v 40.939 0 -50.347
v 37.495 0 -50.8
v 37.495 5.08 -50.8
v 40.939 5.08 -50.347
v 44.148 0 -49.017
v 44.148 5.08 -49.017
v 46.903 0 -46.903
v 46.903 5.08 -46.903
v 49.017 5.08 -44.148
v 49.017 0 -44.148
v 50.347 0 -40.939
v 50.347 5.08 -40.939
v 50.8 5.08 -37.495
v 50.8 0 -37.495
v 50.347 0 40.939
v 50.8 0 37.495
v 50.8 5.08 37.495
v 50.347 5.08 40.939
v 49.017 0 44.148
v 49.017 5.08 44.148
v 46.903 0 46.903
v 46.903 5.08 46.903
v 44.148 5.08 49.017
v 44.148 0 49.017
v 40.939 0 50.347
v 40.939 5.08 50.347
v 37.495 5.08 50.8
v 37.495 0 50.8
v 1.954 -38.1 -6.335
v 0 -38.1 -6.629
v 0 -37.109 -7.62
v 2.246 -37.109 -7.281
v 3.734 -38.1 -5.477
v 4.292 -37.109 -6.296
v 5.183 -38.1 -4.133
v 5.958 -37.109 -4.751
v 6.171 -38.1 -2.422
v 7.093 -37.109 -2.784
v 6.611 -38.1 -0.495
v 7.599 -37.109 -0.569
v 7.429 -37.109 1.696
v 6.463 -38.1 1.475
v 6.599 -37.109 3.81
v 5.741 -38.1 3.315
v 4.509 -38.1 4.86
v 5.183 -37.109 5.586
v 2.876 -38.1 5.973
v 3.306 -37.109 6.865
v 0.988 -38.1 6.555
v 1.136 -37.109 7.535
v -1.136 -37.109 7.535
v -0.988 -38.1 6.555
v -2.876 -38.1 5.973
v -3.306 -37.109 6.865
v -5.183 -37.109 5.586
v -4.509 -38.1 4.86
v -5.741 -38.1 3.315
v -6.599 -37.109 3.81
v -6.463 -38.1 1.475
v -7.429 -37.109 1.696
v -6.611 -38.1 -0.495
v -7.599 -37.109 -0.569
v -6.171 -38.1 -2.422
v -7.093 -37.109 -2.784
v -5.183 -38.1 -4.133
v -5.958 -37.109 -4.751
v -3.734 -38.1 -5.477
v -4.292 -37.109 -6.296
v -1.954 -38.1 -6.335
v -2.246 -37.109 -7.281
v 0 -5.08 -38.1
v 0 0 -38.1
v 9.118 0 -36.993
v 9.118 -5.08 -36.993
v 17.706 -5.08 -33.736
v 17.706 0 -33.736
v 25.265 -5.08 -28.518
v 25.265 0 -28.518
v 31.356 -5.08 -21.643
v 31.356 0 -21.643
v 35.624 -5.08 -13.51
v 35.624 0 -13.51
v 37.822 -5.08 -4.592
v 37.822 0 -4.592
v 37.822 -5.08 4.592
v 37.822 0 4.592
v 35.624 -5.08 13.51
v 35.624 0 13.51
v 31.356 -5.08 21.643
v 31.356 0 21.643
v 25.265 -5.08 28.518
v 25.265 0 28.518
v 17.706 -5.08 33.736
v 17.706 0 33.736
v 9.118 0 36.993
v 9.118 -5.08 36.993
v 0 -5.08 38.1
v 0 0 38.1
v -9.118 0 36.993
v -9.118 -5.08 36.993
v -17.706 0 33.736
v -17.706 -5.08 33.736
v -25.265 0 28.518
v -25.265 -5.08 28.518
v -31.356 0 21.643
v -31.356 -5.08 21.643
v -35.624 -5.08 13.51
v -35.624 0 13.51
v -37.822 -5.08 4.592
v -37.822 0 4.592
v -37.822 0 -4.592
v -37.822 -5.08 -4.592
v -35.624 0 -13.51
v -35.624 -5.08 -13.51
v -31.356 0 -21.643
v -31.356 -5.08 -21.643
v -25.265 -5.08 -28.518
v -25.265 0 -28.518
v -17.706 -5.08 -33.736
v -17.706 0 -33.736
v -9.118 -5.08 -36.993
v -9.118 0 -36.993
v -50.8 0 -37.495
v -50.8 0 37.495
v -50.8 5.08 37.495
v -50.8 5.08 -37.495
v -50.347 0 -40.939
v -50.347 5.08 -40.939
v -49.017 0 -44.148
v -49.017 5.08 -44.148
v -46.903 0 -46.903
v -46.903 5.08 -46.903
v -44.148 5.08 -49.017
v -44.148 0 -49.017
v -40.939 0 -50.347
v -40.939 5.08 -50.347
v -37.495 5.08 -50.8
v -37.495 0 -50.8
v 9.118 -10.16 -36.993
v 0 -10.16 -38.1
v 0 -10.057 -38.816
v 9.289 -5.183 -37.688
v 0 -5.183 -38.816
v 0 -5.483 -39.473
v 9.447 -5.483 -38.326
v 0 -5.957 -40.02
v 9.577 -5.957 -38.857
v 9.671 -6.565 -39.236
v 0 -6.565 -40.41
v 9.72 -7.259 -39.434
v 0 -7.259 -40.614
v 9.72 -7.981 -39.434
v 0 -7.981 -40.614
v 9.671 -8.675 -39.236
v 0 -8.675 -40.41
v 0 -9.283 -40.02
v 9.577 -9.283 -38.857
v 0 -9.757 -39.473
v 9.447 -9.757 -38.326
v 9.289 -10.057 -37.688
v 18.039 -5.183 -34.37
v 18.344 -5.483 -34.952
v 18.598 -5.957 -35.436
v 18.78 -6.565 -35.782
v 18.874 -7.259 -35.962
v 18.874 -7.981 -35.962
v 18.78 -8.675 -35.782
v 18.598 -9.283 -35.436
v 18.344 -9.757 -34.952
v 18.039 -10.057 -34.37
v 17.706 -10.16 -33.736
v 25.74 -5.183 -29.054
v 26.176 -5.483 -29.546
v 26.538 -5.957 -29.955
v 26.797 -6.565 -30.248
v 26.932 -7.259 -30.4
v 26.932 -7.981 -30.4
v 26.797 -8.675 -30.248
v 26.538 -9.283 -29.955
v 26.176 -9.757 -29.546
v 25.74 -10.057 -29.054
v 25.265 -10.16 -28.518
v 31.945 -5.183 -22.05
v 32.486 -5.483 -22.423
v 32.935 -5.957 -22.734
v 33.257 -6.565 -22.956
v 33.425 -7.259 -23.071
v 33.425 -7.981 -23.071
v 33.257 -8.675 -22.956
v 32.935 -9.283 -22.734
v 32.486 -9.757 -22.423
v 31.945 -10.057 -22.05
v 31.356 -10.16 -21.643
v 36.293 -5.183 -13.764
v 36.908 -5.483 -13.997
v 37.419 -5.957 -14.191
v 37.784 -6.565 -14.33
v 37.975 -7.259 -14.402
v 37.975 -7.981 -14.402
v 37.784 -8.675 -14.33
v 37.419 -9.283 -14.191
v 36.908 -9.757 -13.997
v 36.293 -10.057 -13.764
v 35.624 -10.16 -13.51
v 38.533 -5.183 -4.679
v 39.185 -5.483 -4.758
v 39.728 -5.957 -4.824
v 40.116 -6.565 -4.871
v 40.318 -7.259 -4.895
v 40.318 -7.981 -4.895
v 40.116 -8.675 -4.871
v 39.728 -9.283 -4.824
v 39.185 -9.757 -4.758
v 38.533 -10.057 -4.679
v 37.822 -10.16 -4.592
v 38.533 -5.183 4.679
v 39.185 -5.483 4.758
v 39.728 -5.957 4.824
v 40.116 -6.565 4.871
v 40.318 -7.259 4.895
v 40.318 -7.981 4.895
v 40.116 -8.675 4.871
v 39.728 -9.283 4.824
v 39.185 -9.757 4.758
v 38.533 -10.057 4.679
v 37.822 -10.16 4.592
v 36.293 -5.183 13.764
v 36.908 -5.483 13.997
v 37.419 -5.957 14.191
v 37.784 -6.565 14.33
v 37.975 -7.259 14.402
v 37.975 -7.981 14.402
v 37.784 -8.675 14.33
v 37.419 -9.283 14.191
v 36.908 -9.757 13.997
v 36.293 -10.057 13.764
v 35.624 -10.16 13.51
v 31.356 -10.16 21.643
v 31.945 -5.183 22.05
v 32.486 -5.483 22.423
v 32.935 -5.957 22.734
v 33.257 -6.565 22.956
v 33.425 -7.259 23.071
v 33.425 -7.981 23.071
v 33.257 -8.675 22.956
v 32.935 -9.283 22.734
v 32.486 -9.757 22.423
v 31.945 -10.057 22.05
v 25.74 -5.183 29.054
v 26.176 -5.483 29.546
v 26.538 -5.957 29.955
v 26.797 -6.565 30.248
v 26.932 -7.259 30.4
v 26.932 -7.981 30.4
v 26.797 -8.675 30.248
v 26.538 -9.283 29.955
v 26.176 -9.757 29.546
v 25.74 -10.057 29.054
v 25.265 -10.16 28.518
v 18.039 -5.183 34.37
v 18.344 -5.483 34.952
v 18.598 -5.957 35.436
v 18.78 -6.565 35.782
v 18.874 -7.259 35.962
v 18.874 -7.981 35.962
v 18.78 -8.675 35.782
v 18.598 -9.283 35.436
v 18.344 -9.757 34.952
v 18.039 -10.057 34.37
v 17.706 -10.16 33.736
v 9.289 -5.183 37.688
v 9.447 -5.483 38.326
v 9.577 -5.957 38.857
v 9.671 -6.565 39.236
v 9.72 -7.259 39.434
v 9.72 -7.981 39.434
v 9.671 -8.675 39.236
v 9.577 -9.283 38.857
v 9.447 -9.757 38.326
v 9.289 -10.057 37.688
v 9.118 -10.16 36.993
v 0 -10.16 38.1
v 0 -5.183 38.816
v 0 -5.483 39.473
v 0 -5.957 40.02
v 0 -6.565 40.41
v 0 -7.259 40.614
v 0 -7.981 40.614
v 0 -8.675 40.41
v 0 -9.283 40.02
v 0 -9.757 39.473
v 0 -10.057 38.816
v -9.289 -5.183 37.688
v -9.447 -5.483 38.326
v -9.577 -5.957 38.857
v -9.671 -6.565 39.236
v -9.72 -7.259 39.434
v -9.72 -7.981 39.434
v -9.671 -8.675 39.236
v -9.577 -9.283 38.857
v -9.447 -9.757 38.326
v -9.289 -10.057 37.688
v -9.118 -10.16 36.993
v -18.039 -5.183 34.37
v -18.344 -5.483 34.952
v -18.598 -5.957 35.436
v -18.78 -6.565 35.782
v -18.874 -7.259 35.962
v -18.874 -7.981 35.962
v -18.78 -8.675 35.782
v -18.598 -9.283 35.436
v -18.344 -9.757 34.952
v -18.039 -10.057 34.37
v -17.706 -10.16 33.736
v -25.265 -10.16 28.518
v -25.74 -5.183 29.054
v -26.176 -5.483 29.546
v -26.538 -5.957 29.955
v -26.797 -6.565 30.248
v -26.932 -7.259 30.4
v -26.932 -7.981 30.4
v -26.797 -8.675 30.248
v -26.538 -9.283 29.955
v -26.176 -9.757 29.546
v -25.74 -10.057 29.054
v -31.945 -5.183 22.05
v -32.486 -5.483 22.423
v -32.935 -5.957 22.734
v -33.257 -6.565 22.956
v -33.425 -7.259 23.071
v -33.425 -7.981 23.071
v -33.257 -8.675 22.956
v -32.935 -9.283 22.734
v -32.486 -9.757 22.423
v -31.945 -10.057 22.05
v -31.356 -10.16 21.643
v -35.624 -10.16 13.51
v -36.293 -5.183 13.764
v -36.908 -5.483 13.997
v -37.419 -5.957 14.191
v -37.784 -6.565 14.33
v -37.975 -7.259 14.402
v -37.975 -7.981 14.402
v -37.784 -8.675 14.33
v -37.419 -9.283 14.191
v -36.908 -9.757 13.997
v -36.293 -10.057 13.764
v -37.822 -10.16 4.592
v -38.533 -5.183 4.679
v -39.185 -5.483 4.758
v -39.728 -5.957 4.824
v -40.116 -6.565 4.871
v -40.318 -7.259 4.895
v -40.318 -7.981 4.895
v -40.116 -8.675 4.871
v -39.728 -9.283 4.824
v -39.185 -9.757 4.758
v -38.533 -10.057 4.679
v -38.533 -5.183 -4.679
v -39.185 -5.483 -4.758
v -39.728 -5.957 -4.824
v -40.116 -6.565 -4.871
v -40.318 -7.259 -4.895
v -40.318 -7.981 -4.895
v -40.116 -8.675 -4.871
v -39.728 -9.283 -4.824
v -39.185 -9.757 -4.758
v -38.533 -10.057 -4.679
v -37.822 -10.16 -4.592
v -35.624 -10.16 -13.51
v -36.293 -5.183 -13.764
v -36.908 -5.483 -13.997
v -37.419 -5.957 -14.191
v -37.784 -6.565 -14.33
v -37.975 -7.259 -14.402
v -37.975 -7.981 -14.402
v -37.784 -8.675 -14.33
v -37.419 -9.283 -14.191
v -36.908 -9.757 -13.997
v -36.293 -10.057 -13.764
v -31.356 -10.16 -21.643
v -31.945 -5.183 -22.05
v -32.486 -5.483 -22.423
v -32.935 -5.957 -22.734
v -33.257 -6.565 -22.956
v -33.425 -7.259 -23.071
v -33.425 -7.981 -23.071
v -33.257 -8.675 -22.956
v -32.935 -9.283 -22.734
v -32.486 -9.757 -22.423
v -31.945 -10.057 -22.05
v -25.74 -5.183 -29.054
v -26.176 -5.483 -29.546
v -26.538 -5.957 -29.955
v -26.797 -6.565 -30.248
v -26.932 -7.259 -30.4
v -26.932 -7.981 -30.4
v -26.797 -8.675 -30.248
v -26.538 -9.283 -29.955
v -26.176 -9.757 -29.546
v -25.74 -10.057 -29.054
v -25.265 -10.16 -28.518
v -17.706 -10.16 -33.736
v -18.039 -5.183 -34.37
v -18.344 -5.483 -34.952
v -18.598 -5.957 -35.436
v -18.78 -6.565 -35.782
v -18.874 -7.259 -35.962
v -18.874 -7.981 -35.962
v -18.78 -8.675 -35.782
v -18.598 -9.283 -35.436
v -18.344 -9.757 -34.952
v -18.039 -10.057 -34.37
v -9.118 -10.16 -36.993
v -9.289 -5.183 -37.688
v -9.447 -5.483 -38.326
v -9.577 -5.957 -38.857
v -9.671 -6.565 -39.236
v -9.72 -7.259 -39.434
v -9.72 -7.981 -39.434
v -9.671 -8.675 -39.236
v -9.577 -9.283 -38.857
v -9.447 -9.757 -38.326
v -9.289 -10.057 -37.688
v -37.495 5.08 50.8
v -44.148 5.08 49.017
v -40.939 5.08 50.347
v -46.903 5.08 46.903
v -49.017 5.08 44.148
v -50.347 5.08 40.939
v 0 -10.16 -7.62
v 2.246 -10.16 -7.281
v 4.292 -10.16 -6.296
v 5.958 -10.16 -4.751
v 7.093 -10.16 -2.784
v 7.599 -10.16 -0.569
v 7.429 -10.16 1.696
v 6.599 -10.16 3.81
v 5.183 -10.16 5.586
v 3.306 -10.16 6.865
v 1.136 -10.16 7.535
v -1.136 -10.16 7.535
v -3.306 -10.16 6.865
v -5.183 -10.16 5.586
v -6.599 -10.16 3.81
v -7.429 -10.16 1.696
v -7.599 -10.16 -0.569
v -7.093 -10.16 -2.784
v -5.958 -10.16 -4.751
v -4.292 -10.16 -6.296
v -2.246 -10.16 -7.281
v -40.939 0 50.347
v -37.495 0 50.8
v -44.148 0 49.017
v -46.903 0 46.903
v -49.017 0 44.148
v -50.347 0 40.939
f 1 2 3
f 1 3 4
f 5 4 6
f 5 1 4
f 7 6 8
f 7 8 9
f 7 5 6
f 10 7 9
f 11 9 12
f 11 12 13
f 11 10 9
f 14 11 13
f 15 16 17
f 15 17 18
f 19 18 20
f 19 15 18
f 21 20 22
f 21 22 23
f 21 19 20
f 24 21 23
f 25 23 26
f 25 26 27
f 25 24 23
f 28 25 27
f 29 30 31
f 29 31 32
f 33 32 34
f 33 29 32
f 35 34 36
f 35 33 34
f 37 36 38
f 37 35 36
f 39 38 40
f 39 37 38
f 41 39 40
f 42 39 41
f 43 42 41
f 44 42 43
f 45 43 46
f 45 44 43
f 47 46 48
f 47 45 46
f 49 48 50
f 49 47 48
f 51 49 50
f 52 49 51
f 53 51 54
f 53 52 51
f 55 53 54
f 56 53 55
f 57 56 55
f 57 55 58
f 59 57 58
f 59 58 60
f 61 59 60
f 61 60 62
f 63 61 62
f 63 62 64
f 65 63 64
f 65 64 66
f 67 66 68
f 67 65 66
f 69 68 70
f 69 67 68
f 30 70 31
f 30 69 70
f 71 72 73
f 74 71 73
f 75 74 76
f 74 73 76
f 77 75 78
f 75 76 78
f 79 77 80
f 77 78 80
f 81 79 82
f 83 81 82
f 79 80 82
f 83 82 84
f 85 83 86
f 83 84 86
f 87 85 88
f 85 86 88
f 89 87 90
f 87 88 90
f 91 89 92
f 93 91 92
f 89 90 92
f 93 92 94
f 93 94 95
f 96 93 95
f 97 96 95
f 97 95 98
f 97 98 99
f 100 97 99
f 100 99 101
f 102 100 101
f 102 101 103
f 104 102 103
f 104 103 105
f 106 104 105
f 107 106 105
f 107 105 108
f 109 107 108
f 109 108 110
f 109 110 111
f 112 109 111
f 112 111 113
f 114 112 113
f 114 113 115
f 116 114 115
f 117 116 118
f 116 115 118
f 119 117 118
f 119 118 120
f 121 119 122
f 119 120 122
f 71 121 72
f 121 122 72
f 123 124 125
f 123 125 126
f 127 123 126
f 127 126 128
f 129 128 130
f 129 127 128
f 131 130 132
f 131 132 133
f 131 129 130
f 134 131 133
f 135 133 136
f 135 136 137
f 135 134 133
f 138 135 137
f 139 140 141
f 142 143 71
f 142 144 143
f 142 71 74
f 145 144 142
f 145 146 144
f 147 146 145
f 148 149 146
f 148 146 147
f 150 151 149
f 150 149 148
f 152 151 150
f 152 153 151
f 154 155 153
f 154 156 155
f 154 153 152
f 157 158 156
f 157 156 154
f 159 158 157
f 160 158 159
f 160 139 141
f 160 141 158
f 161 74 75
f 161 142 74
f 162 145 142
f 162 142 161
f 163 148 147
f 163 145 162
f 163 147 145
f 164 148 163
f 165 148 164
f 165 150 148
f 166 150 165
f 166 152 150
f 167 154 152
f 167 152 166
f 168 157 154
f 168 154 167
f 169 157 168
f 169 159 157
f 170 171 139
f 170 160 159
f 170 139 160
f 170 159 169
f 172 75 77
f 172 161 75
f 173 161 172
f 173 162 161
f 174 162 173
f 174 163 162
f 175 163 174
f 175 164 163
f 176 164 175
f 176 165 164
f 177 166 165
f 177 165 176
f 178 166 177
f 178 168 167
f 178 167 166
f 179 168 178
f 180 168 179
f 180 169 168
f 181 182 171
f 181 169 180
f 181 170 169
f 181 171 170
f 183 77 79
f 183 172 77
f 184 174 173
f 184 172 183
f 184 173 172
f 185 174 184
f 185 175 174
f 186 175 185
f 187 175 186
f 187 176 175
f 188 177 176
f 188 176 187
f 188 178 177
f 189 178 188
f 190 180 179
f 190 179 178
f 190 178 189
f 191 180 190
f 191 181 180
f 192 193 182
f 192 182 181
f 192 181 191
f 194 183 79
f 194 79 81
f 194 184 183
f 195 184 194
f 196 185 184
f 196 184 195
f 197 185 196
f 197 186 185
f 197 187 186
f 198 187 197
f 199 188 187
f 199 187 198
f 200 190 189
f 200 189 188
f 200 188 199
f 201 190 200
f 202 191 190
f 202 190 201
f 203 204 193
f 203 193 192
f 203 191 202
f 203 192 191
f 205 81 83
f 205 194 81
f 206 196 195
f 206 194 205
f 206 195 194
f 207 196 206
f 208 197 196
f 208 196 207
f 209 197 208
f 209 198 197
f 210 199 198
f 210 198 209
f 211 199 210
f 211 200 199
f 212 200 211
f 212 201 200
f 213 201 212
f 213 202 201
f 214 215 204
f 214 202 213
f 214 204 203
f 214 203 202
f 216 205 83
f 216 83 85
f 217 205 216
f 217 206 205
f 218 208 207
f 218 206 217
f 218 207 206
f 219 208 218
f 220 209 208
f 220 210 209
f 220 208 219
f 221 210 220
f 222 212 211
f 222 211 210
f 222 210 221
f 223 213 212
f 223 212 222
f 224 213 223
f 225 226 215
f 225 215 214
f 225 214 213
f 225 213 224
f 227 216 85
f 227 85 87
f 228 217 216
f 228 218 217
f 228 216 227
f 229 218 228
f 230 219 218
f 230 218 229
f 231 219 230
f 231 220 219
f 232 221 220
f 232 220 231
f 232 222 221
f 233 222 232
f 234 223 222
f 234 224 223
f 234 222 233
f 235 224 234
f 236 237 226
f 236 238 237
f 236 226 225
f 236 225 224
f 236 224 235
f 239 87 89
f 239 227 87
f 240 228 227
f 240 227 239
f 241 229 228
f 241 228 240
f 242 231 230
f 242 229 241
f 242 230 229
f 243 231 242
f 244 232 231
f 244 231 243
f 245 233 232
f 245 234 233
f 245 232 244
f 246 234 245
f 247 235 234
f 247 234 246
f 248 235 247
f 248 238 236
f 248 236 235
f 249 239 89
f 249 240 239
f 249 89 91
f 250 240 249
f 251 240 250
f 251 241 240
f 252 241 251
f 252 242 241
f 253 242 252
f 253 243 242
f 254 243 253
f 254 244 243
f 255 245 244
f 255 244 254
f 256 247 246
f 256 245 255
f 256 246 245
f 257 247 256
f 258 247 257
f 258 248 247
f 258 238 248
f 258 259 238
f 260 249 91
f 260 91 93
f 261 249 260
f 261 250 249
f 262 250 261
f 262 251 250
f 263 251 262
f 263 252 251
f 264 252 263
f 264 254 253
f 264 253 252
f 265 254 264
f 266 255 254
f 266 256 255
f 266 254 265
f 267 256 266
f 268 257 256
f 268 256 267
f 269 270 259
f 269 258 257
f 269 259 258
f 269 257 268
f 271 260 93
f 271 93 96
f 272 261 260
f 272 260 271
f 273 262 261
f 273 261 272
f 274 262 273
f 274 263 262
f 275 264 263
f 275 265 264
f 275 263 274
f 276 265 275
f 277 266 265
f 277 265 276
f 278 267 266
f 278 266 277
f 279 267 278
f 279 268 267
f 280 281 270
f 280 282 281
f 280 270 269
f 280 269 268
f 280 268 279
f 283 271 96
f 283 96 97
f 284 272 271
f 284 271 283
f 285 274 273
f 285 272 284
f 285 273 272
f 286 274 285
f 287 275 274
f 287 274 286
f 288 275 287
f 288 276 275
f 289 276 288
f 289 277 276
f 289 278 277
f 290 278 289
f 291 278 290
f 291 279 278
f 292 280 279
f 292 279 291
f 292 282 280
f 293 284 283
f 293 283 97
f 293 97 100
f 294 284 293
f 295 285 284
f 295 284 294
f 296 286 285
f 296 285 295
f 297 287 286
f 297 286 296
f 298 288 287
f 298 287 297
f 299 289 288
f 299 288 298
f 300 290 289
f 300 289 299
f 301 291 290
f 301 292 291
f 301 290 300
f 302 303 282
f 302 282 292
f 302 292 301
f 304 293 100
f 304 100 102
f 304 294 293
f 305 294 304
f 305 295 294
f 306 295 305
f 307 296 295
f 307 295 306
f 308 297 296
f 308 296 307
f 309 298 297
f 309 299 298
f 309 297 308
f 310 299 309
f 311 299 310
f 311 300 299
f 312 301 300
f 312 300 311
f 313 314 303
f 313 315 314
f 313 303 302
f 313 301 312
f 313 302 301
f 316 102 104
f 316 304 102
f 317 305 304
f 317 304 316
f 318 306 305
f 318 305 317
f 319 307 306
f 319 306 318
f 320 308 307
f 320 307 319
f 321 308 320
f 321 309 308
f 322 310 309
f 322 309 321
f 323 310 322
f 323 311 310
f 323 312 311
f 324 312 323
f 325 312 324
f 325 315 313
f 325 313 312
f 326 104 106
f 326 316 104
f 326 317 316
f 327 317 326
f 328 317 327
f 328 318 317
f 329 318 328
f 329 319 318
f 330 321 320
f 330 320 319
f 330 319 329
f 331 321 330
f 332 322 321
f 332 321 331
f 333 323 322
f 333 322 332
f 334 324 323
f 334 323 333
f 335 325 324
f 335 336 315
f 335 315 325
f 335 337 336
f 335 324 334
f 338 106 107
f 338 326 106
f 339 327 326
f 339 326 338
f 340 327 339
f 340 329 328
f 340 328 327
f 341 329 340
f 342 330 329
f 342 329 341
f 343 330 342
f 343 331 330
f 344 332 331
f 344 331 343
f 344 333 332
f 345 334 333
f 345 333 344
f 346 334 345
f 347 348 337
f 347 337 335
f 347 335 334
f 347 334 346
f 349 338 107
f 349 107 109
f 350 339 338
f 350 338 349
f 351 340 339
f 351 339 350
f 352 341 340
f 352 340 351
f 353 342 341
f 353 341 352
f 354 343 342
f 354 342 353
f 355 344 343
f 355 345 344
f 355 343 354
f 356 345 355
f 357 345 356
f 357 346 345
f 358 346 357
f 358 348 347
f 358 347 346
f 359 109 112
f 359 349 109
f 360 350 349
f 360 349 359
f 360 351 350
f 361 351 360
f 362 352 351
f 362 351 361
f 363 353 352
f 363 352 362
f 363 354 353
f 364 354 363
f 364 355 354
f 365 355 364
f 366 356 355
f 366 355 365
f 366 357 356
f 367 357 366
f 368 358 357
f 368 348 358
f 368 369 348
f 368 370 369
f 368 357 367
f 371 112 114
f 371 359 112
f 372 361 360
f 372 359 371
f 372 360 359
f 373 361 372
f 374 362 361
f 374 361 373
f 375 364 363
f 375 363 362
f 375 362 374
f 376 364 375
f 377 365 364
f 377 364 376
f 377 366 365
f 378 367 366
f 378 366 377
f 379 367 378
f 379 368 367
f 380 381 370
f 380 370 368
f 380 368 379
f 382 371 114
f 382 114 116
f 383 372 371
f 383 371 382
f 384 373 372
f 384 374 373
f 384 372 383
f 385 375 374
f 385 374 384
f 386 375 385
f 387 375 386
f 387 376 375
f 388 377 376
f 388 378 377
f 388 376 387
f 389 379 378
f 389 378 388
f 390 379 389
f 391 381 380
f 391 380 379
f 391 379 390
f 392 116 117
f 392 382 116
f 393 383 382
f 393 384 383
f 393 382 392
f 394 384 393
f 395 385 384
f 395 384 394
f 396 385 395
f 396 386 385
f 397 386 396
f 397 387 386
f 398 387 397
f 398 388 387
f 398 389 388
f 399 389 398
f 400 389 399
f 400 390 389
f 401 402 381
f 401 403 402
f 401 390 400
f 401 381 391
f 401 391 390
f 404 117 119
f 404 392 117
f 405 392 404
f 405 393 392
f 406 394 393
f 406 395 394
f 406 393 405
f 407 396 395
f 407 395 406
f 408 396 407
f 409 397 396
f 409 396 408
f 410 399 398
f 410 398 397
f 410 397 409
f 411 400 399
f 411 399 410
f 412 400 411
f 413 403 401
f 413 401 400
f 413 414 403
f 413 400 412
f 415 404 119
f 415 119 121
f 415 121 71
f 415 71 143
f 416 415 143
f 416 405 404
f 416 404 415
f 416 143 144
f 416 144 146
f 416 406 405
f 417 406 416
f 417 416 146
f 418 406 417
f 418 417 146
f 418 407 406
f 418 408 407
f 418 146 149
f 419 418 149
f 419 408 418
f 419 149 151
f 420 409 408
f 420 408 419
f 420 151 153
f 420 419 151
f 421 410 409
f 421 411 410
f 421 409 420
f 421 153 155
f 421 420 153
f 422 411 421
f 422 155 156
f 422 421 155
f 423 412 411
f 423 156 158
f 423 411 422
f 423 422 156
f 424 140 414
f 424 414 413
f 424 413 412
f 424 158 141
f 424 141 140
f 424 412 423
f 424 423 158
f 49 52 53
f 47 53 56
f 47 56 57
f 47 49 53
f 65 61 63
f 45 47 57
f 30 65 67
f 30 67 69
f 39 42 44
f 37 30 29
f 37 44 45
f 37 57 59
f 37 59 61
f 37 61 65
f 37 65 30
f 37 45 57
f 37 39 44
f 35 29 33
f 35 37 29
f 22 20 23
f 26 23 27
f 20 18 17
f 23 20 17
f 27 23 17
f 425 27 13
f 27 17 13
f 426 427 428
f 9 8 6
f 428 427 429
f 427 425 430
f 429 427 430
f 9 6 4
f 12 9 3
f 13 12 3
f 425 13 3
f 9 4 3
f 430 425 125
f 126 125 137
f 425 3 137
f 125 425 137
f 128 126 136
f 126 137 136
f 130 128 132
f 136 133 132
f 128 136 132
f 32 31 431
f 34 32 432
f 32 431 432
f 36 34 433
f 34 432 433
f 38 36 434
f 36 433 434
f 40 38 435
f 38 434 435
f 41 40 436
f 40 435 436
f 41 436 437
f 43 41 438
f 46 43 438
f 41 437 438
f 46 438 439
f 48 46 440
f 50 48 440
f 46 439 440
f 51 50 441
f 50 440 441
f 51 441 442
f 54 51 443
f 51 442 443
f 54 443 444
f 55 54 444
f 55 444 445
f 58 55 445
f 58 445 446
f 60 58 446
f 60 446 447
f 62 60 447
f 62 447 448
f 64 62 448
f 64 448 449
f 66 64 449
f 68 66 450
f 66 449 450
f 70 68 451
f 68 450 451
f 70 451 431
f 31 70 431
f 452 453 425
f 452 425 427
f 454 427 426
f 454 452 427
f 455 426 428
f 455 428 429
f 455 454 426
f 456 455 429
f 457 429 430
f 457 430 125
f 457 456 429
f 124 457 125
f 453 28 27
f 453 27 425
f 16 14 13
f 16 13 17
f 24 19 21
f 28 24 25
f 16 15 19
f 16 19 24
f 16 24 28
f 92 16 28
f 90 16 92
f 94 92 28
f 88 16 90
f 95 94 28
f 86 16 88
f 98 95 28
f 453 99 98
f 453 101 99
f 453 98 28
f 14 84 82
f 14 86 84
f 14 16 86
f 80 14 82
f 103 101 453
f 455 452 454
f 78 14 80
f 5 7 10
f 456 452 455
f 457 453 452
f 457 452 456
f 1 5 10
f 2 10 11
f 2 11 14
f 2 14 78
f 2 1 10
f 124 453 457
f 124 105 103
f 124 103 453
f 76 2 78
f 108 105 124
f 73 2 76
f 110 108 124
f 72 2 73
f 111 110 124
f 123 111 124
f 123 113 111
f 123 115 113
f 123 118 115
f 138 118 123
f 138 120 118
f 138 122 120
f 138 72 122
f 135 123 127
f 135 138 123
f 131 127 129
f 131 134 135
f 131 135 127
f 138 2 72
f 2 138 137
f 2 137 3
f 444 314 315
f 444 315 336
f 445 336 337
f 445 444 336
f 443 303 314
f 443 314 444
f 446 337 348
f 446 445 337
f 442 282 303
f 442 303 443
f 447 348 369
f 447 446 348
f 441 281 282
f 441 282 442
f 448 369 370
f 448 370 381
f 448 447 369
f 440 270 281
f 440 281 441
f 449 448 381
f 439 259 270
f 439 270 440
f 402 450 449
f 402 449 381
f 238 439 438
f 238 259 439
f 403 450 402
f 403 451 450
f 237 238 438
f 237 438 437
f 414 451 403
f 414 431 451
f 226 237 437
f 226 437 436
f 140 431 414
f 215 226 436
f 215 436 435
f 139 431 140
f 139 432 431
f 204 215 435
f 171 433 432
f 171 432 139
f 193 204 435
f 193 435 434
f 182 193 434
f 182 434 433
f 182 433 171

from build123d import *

# Parameters (mm, degrees)
BOSS_EXTRUDE1_DEPTH = 5.08
SKETCH2_R           = 38.1
BOSS_EXTRUDE2_DEPTH = 10.16
SKETCH3_R           = 2.54
SKETCH5_R           = 7.62
BOSS_EXTRUDE3_DEPTH = 27.94
CHAMFER4_SIZE       = 0.9906


with BuildPart() as part:
    # Sketch1 → Boss-Extrude1 (new body)
    with BuildSketch(Plane(origin=(0, 0, 0), x_dir=(1, 0, 0), z_dir=(0, 1, 0))):
        with BuildLine():
            Line((-37.495119859, 50.8), (37.495119859, 50.8))
            ThreePointArc((37.495119859, 50.8), (46.90309083, 46.90309083), (50.8, 37.495119859))
            Line((50.8, 37.495119859), (50.8, -37.495119859))
            ThreePointArc((50.8, -37.495119859), (46.90309083, -46.90309083), (37.495119859, -50.8))
            Line((37.495119859, -50.8), (-37.495119859, -50.8))
            ThreePointArc((-37.495119859, -50.8), (-46.90309083, -46.90309083), (-50.8, -37.495119859))
            Line((-50.8, -37.495119859), (-50.8, 37.495119859))
            ThreePointArc((-50.8, 37.495119859), (-46.90309083, 46.90309083), (-37.495119859, 50.8))
        make_face()
    extrude(amount=BOSS_EXTRUDE1_DEPTH)

    # Sketch2 → Boss-Extrude2 (add)
    with BuildSketch(Plane.XZ):
        with Locations(Location((0, 0, 0), (0, 0, 270))):
            Circle(SKETCH2_R)
    extrude(amount=BOSS_EXTRUDE2_DEPTH)

    # Sketch3 → Revolve1 (revolve)
    with BuildSketch(Plane(origin=(0, 0, 0), x_dir=(0, 0, -1), z_dir=(1, 0, 0)), mode=Mode.PRIVATE) as revolve1_sk:
        with Locations((-38.1, -7.62)):
            Circle(SKETCH3_R)
    revolve(revolve1_sk.sketch.rotate(Axis((0, 0, 0), (0, -1, 0)), 180), axis=Axis((0, 0, 0), (0, -1, 0)))

    # Sketch5 → Boss-Extrude3 (add)
    with BuildSketch(Plane.XZ.offset(10.16)):
        with Locations(Location((0, 0, 0), (0, 0, 270))):
            Circle(SKETCH5_R)
    extrude(amount=BOSS_EXTRUDE3_DEPTH)

    # Chamfer4
    chamfer4_edges = [part.edges().sort_by_distance(p)[0] for p in [
        (0, -38.1, 7.62),
    ]]
    chamfer(chamfer4_edges, length=CHAMFER4_SIZE)


solid = part.part
